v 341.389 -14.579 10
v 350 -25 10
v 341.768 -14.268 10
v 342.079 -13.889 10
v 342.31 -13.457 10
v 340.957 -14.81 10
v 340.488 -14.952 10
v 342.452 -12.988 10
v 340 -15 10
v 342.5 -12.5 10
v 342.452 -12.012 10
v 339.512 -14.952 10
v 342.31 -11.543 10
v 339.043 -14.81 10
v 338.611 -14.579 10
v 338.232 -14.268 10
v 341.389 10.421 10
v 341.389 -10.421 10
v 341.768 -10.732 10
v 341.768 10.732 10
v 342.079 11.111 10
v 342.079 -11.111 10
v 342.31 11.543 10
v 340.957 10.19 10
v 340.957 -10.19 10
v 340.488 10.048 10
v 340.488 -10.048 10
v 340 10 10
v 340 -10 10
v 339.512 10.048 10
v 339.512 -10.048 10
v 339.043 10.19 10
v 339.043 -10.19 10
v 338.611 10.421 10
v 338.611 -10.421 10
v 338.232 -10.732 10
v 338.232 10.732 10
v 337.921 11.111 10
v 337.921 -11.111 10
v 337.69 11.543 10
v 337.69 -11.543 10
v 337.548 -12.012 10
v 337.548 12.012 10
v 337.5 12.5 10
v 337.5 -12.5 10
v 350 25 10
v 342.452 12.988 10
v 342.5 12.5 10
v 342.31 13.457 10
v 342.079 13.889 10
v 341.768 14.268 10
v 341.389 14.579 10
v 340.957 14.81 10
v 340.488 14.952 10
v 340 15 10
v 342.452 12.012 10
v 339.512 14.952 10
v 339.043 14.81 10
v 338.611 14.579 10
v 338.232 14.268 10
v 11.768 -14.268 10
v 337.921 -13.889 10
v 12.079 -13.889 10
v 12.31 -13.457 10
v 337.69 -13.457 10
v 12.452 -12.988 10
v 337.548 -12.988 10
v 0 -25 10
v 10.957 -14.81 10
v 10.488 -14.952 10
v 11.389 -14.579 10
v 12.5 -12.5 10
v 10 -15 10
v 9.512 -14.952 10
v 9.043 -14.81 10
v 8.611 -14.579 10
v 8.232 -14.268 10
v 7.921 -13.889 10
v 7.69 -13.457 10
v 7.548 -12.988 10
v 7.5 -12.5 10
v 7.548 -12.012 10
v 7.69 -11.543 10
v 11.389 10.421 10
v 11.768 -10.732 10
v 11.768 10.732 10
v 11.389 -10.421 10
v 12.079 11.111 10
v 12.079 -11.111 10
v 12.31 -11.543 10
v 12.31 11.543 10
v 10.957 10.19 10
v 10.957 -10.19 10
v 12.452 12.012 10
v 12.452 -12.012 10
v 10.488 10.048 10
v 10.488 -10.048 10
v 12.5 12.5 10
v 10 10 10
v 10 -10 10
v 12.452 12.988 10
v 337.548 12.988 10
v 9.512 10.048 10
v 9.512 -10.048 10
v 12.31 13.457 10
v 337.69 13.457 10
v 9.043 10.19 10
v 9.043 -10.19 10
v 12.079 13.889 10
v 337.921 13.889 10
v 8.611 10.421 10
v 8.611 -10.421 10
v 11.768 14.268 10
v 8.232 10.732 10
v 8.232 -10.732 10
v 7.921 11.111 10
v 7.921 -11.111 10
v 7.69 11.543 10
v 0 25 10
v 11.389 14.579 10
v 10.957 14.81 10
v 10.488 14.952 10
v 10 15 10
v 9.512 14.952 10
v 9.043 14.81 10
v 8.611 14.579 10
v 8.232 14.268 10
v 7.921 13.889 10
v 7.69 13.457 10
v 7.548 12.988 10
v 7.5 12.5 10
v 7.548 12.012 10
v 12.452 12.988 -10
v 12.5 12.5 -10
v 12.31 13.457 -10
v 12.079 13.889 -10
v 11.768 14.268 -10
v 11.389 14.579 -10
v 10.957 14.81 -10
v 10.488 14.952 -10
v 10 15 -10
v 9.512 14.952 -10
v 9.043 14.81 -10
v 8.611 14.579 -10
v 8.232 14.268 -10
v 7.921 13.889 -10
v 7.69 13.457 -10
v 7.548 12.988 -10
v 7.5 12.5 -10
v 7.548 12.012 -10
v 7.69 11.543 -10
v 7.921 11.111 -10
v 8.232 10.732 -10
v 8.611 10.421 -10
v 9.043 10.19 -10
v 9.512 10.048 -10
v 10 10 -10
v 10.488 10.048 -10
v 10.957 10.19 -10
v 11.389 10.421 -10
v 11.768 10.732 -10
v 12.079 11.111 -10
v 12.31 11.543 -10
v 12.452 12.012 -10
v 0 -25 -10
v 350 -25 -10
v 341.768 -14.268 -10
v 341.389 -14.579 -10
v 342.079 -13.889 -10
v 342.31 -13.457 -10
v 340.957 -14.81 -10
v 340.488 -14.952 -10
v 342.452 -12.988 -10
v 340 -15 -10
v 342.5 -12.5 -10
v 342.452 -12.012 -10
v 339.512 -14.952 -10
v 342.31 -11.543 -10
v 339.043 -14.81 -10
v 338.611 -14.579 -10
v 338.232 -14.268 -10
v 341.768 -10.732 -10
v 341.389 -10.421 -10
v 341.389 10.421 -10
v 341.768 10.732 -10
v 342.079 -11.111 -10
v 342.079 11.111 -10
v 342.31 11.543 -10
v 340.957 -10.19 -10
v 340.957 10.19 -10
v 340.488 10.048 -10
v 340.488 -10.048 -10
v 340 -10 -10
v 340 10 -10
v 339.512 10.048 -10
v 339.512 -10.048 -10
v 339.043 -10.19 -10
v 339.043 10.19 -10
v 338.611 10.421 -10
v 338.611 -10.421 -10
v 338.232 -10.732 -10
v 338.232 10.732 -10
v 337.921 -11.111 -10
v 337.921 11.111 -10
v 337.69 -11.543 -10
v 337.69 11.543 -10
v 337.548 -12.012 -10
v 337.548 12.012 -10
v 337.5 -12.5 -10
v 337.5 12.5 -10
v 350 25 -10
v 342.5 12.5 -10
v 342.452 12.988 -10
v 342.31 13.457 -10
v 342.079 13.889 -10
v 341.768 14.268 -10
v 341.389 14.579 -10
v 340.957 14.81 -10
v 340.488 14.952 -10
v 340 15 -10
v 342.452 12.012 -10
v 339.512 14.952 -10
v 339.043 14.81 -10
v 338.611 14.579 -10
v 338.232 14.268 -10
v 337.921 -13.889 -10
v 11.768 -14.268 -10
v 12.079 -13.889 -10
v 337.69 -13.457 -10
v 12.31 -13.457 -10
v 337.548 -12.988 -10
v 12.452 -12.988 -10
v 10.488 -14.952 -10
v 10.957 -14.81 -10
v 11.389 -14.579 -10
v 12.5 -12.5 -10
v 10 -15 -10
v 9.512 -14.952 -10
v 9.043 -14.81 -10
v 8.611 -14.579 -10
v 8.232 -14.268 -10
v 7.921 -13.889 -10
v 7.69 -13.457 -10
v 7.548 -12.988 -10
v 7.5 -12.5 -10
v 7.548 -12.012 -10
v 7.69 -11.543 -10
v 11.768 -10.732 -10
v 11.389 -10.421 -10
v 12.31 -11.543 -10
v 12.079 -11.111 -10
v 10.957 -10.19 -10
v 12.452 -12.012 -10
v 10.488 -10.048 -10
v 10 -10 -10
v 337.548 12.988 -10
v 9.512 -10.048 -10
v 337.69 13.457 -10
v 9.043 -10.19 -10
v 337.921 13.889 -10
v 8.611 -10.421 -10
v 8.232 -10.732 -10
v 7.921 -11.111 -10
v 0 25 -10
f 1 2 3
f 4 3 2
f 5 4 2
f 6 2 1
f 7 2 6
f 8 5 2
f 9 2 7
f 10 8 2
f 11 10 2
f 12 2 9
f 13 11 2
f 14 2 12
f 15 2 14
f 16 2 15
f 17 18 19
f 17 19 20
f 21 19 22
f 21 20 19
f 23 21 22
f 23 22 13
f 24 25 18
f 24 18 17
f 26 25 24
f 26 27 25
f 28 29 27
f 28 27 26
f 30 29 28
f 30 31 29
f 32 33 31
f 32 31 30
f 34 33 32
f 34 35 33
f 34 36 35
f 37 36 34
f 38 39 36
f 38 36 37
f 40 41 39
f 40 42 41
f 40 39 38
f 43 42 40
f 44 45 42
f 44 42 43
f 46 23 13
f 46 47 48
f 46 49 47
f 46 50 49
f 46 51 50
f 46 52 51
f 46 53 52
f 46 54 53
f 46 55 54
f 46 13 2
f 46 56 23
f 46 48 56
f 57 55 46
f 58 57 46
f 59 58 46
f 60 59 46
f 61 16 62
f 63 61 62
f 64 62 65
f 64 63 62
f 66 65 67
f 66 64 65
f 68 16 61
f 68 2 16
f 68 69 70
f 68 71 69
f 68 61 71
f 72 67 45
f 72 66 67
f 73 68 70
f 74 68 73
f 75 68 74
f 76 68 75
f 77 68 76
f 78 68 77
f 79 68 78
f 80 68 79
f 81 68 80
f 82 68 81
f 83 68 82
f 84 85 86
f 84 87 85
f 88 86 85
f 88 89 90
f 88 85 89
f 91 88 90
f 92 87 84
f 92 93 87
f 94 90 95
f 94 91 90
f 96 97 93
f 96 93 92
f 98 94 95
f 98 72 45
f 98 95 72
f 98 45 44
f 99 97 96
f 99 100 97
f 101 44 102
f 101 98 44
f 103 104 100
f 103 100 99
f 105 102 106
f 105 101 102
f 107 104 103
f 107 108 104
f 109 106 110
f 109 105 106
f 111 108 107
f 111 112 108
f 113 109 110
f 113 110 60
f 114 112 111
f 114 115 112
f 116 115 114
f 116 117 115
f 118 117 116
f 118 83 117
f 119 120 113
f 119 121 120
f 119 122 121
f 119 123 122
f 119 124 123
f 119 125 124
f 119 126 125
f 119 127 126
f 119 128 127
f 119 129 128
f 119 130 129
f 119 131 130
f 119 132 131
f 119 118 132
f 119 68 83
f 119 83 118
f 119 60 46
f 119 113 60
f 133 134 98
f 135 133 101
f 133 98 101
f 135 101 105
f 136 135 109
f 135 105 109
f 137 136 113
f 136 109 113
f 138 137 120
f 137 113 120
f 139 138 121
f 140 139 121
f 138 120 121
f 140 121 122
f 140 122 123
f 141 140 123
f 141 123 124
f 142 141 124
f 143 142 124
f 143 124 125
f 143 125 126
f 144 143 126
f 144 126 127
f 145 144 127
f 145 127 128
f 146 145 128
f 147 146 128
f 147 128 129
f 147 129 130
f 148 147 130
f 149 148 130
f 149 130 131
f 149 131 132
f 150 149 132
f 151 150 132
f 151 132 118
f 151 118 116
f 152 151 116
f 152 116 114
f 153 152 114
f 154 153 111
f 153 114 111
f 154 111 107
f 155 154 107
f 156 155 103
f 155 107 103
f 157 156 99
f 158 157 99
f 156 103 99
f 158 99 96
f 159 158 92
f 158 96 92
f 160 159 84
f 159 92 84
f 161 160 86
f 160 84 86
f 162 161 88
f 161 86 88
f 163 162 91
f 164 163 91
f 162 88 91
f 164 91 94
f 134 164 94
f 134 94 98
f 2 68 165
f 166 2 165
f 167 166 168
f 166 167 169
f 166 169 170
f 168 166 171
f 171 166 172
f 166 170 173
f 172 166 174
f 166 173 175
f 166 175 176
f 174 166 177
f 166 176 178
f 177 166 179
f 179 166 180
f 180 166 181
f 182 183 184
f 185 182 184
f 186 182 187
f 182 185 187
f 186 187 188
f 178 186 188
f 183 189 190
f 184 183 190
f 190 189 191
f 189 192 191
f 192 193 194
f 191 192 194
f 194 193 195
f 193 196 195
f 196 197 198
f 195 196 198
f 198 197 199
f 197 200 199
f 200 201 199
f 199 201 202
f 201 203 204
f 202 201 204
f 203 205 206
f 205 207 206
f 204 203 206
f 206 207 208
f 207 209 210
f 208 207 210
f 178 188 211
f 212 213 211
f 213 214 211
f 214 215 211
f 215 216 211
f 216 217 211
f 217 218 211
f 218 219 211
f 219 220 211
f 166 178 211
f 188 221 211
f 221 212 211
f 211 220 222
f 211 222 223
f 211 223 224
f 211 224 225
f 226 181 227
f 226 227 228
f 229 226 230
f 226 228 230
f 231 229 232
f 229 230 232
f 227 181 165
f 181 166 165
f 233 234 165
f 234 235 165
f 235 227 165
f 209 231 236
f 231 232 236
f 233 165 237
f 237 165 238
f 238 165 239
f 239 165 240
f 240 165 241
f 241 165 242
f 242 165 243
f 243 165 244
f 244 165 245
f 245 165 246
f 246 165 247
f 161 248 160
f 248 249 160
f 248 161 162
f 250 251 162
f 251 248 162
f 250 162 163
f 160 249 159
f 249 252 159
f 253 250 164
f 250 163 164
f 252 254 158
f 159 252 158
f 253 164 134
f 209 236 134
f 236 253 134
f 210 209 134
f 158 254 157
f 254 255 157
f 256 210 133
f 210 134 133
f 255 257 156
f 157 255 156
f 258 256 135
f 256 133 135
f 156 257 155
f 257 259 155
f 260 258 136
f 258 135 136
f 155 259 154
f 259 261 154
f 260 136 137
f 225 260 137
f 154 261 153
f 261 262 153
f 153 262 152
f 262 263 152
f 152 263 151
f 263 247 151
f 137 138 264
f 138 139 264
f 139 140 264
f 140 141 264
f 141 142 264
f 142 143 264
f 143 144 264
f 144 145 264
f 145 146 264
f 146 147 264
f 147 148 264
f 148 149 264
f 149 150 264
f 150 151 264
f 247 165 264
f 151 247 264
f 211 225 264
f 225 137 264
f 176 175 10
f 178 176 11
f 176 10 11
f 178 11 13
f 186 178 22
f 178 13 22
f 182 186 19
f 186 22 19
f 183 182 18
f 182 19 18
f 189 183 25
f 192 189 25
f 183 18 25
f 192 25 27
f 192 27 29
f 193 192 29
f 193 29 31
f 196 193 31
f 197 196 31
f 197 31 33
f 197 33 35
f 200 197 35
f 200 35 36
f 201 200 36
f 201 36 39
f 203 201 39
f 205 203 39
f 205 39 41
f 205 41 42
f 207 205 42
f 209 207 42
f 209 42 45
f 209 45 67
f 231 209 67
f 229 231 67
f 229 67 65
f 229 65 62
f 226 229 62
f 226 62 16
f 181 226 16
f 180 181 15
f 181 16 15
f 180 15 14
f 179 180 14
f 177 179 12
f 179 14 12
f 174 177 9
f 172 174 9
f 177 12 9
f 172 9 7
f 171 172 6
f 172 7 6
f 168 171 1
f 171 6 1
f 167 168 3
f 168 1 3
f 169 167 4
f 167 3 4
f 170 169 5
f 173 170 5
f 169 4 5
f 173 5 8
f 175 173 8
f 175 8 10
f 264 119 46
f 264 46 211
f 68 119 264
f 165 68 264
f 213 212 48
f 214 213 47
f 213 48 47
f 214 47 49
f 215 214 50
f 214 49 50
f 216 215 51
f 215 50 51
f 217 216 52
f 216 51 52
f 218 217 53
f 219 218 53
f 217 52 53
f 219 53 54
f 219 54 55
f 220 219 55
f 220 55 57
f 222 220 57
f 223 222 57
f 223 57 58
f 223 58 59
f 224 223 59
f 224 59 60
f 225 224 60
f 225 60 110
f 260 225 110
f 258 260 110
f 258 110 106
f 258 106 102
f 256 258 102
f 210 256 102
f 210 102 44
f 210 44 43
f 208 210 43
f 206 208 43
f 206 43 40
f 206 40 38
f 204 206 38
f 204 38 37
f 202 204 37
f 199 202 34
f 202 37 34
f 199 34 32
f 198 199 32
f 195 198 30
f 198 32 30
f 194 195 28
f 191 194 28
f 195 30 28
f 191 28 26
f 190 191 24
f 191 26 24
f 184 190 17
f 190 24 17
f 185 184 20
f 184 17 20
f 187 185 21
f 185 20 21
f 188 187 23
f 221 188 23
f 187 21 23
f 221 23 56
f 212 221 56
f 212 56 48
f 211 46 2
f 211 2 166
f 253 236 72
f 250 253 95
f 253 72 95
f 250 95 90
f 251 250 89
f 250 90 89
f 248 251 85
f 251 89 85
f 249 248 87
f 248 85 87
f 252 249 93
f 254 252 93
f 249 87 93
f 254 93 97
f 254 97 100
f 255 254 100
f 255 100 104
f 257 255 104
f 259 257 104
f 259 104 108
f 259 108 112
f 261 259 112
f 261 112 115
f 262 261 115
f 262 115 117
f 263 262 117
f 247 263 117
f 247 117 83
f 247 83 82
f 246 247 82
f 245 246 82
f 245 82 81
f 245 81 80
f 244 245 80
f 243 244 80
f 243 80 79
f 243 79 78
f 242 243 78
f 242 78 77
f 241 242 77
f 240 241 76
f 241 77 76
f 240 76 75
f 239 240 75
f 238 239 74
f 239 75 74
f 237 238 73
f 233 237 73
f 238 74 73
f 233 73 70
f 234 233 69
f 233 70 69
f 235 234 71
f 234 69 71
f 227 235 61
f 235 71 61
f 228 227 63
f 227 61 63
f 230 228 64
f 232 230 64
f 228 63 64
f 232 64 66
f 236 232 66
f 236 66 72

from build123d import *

# Parameters (mm, degrees)
SKIZZE1_W                       = 20
SKIZZE1_H                       = 50
AUFSATZ_LINEAR_AUSTRAGEN1_DEPTH = 350
SKIZZE2_R                       = 2.5
SCHNITT_LINEAR_AUSTRAGEN1_DEPTH = 352.461235416


with BuildPart() as part:
    # Skizze1 → Aufsatz-Linear austragen1 (new body)
    with BuildSketch(Plane(origin=(0, 0, 0), x_dir=(0, 0, -1), z_dir=(1, 0, 0))):
        Rectangle(SKIZZE1_W, SKIZZE1_H)
    extrude(amount=AUFSATZ_LINEAR_AUSTRAGEN1_DEPTH)

    # Skizze2 → Schnitt-Linear austragen1 (cut, through all)
    with BuildSketch(Plane.XY.offset(10)):
        with Locations((10, -12.5)):
            Circle(SKIZZE2_R)
        with Locations((10, 12.5)):
            Circle(SKIZZE2_R)
        with Locations((340, -12.5)):
            Circle(SKIZZE2_R)
        with Locations((340, 12.5)):
            Circle(SKIZZE2_R)
    extrude(amount=-SCHNITT_LINEAR_AUSTRAGEN1_DEPTH, mode=Mode.SUBTRACT)


solid = part.part
